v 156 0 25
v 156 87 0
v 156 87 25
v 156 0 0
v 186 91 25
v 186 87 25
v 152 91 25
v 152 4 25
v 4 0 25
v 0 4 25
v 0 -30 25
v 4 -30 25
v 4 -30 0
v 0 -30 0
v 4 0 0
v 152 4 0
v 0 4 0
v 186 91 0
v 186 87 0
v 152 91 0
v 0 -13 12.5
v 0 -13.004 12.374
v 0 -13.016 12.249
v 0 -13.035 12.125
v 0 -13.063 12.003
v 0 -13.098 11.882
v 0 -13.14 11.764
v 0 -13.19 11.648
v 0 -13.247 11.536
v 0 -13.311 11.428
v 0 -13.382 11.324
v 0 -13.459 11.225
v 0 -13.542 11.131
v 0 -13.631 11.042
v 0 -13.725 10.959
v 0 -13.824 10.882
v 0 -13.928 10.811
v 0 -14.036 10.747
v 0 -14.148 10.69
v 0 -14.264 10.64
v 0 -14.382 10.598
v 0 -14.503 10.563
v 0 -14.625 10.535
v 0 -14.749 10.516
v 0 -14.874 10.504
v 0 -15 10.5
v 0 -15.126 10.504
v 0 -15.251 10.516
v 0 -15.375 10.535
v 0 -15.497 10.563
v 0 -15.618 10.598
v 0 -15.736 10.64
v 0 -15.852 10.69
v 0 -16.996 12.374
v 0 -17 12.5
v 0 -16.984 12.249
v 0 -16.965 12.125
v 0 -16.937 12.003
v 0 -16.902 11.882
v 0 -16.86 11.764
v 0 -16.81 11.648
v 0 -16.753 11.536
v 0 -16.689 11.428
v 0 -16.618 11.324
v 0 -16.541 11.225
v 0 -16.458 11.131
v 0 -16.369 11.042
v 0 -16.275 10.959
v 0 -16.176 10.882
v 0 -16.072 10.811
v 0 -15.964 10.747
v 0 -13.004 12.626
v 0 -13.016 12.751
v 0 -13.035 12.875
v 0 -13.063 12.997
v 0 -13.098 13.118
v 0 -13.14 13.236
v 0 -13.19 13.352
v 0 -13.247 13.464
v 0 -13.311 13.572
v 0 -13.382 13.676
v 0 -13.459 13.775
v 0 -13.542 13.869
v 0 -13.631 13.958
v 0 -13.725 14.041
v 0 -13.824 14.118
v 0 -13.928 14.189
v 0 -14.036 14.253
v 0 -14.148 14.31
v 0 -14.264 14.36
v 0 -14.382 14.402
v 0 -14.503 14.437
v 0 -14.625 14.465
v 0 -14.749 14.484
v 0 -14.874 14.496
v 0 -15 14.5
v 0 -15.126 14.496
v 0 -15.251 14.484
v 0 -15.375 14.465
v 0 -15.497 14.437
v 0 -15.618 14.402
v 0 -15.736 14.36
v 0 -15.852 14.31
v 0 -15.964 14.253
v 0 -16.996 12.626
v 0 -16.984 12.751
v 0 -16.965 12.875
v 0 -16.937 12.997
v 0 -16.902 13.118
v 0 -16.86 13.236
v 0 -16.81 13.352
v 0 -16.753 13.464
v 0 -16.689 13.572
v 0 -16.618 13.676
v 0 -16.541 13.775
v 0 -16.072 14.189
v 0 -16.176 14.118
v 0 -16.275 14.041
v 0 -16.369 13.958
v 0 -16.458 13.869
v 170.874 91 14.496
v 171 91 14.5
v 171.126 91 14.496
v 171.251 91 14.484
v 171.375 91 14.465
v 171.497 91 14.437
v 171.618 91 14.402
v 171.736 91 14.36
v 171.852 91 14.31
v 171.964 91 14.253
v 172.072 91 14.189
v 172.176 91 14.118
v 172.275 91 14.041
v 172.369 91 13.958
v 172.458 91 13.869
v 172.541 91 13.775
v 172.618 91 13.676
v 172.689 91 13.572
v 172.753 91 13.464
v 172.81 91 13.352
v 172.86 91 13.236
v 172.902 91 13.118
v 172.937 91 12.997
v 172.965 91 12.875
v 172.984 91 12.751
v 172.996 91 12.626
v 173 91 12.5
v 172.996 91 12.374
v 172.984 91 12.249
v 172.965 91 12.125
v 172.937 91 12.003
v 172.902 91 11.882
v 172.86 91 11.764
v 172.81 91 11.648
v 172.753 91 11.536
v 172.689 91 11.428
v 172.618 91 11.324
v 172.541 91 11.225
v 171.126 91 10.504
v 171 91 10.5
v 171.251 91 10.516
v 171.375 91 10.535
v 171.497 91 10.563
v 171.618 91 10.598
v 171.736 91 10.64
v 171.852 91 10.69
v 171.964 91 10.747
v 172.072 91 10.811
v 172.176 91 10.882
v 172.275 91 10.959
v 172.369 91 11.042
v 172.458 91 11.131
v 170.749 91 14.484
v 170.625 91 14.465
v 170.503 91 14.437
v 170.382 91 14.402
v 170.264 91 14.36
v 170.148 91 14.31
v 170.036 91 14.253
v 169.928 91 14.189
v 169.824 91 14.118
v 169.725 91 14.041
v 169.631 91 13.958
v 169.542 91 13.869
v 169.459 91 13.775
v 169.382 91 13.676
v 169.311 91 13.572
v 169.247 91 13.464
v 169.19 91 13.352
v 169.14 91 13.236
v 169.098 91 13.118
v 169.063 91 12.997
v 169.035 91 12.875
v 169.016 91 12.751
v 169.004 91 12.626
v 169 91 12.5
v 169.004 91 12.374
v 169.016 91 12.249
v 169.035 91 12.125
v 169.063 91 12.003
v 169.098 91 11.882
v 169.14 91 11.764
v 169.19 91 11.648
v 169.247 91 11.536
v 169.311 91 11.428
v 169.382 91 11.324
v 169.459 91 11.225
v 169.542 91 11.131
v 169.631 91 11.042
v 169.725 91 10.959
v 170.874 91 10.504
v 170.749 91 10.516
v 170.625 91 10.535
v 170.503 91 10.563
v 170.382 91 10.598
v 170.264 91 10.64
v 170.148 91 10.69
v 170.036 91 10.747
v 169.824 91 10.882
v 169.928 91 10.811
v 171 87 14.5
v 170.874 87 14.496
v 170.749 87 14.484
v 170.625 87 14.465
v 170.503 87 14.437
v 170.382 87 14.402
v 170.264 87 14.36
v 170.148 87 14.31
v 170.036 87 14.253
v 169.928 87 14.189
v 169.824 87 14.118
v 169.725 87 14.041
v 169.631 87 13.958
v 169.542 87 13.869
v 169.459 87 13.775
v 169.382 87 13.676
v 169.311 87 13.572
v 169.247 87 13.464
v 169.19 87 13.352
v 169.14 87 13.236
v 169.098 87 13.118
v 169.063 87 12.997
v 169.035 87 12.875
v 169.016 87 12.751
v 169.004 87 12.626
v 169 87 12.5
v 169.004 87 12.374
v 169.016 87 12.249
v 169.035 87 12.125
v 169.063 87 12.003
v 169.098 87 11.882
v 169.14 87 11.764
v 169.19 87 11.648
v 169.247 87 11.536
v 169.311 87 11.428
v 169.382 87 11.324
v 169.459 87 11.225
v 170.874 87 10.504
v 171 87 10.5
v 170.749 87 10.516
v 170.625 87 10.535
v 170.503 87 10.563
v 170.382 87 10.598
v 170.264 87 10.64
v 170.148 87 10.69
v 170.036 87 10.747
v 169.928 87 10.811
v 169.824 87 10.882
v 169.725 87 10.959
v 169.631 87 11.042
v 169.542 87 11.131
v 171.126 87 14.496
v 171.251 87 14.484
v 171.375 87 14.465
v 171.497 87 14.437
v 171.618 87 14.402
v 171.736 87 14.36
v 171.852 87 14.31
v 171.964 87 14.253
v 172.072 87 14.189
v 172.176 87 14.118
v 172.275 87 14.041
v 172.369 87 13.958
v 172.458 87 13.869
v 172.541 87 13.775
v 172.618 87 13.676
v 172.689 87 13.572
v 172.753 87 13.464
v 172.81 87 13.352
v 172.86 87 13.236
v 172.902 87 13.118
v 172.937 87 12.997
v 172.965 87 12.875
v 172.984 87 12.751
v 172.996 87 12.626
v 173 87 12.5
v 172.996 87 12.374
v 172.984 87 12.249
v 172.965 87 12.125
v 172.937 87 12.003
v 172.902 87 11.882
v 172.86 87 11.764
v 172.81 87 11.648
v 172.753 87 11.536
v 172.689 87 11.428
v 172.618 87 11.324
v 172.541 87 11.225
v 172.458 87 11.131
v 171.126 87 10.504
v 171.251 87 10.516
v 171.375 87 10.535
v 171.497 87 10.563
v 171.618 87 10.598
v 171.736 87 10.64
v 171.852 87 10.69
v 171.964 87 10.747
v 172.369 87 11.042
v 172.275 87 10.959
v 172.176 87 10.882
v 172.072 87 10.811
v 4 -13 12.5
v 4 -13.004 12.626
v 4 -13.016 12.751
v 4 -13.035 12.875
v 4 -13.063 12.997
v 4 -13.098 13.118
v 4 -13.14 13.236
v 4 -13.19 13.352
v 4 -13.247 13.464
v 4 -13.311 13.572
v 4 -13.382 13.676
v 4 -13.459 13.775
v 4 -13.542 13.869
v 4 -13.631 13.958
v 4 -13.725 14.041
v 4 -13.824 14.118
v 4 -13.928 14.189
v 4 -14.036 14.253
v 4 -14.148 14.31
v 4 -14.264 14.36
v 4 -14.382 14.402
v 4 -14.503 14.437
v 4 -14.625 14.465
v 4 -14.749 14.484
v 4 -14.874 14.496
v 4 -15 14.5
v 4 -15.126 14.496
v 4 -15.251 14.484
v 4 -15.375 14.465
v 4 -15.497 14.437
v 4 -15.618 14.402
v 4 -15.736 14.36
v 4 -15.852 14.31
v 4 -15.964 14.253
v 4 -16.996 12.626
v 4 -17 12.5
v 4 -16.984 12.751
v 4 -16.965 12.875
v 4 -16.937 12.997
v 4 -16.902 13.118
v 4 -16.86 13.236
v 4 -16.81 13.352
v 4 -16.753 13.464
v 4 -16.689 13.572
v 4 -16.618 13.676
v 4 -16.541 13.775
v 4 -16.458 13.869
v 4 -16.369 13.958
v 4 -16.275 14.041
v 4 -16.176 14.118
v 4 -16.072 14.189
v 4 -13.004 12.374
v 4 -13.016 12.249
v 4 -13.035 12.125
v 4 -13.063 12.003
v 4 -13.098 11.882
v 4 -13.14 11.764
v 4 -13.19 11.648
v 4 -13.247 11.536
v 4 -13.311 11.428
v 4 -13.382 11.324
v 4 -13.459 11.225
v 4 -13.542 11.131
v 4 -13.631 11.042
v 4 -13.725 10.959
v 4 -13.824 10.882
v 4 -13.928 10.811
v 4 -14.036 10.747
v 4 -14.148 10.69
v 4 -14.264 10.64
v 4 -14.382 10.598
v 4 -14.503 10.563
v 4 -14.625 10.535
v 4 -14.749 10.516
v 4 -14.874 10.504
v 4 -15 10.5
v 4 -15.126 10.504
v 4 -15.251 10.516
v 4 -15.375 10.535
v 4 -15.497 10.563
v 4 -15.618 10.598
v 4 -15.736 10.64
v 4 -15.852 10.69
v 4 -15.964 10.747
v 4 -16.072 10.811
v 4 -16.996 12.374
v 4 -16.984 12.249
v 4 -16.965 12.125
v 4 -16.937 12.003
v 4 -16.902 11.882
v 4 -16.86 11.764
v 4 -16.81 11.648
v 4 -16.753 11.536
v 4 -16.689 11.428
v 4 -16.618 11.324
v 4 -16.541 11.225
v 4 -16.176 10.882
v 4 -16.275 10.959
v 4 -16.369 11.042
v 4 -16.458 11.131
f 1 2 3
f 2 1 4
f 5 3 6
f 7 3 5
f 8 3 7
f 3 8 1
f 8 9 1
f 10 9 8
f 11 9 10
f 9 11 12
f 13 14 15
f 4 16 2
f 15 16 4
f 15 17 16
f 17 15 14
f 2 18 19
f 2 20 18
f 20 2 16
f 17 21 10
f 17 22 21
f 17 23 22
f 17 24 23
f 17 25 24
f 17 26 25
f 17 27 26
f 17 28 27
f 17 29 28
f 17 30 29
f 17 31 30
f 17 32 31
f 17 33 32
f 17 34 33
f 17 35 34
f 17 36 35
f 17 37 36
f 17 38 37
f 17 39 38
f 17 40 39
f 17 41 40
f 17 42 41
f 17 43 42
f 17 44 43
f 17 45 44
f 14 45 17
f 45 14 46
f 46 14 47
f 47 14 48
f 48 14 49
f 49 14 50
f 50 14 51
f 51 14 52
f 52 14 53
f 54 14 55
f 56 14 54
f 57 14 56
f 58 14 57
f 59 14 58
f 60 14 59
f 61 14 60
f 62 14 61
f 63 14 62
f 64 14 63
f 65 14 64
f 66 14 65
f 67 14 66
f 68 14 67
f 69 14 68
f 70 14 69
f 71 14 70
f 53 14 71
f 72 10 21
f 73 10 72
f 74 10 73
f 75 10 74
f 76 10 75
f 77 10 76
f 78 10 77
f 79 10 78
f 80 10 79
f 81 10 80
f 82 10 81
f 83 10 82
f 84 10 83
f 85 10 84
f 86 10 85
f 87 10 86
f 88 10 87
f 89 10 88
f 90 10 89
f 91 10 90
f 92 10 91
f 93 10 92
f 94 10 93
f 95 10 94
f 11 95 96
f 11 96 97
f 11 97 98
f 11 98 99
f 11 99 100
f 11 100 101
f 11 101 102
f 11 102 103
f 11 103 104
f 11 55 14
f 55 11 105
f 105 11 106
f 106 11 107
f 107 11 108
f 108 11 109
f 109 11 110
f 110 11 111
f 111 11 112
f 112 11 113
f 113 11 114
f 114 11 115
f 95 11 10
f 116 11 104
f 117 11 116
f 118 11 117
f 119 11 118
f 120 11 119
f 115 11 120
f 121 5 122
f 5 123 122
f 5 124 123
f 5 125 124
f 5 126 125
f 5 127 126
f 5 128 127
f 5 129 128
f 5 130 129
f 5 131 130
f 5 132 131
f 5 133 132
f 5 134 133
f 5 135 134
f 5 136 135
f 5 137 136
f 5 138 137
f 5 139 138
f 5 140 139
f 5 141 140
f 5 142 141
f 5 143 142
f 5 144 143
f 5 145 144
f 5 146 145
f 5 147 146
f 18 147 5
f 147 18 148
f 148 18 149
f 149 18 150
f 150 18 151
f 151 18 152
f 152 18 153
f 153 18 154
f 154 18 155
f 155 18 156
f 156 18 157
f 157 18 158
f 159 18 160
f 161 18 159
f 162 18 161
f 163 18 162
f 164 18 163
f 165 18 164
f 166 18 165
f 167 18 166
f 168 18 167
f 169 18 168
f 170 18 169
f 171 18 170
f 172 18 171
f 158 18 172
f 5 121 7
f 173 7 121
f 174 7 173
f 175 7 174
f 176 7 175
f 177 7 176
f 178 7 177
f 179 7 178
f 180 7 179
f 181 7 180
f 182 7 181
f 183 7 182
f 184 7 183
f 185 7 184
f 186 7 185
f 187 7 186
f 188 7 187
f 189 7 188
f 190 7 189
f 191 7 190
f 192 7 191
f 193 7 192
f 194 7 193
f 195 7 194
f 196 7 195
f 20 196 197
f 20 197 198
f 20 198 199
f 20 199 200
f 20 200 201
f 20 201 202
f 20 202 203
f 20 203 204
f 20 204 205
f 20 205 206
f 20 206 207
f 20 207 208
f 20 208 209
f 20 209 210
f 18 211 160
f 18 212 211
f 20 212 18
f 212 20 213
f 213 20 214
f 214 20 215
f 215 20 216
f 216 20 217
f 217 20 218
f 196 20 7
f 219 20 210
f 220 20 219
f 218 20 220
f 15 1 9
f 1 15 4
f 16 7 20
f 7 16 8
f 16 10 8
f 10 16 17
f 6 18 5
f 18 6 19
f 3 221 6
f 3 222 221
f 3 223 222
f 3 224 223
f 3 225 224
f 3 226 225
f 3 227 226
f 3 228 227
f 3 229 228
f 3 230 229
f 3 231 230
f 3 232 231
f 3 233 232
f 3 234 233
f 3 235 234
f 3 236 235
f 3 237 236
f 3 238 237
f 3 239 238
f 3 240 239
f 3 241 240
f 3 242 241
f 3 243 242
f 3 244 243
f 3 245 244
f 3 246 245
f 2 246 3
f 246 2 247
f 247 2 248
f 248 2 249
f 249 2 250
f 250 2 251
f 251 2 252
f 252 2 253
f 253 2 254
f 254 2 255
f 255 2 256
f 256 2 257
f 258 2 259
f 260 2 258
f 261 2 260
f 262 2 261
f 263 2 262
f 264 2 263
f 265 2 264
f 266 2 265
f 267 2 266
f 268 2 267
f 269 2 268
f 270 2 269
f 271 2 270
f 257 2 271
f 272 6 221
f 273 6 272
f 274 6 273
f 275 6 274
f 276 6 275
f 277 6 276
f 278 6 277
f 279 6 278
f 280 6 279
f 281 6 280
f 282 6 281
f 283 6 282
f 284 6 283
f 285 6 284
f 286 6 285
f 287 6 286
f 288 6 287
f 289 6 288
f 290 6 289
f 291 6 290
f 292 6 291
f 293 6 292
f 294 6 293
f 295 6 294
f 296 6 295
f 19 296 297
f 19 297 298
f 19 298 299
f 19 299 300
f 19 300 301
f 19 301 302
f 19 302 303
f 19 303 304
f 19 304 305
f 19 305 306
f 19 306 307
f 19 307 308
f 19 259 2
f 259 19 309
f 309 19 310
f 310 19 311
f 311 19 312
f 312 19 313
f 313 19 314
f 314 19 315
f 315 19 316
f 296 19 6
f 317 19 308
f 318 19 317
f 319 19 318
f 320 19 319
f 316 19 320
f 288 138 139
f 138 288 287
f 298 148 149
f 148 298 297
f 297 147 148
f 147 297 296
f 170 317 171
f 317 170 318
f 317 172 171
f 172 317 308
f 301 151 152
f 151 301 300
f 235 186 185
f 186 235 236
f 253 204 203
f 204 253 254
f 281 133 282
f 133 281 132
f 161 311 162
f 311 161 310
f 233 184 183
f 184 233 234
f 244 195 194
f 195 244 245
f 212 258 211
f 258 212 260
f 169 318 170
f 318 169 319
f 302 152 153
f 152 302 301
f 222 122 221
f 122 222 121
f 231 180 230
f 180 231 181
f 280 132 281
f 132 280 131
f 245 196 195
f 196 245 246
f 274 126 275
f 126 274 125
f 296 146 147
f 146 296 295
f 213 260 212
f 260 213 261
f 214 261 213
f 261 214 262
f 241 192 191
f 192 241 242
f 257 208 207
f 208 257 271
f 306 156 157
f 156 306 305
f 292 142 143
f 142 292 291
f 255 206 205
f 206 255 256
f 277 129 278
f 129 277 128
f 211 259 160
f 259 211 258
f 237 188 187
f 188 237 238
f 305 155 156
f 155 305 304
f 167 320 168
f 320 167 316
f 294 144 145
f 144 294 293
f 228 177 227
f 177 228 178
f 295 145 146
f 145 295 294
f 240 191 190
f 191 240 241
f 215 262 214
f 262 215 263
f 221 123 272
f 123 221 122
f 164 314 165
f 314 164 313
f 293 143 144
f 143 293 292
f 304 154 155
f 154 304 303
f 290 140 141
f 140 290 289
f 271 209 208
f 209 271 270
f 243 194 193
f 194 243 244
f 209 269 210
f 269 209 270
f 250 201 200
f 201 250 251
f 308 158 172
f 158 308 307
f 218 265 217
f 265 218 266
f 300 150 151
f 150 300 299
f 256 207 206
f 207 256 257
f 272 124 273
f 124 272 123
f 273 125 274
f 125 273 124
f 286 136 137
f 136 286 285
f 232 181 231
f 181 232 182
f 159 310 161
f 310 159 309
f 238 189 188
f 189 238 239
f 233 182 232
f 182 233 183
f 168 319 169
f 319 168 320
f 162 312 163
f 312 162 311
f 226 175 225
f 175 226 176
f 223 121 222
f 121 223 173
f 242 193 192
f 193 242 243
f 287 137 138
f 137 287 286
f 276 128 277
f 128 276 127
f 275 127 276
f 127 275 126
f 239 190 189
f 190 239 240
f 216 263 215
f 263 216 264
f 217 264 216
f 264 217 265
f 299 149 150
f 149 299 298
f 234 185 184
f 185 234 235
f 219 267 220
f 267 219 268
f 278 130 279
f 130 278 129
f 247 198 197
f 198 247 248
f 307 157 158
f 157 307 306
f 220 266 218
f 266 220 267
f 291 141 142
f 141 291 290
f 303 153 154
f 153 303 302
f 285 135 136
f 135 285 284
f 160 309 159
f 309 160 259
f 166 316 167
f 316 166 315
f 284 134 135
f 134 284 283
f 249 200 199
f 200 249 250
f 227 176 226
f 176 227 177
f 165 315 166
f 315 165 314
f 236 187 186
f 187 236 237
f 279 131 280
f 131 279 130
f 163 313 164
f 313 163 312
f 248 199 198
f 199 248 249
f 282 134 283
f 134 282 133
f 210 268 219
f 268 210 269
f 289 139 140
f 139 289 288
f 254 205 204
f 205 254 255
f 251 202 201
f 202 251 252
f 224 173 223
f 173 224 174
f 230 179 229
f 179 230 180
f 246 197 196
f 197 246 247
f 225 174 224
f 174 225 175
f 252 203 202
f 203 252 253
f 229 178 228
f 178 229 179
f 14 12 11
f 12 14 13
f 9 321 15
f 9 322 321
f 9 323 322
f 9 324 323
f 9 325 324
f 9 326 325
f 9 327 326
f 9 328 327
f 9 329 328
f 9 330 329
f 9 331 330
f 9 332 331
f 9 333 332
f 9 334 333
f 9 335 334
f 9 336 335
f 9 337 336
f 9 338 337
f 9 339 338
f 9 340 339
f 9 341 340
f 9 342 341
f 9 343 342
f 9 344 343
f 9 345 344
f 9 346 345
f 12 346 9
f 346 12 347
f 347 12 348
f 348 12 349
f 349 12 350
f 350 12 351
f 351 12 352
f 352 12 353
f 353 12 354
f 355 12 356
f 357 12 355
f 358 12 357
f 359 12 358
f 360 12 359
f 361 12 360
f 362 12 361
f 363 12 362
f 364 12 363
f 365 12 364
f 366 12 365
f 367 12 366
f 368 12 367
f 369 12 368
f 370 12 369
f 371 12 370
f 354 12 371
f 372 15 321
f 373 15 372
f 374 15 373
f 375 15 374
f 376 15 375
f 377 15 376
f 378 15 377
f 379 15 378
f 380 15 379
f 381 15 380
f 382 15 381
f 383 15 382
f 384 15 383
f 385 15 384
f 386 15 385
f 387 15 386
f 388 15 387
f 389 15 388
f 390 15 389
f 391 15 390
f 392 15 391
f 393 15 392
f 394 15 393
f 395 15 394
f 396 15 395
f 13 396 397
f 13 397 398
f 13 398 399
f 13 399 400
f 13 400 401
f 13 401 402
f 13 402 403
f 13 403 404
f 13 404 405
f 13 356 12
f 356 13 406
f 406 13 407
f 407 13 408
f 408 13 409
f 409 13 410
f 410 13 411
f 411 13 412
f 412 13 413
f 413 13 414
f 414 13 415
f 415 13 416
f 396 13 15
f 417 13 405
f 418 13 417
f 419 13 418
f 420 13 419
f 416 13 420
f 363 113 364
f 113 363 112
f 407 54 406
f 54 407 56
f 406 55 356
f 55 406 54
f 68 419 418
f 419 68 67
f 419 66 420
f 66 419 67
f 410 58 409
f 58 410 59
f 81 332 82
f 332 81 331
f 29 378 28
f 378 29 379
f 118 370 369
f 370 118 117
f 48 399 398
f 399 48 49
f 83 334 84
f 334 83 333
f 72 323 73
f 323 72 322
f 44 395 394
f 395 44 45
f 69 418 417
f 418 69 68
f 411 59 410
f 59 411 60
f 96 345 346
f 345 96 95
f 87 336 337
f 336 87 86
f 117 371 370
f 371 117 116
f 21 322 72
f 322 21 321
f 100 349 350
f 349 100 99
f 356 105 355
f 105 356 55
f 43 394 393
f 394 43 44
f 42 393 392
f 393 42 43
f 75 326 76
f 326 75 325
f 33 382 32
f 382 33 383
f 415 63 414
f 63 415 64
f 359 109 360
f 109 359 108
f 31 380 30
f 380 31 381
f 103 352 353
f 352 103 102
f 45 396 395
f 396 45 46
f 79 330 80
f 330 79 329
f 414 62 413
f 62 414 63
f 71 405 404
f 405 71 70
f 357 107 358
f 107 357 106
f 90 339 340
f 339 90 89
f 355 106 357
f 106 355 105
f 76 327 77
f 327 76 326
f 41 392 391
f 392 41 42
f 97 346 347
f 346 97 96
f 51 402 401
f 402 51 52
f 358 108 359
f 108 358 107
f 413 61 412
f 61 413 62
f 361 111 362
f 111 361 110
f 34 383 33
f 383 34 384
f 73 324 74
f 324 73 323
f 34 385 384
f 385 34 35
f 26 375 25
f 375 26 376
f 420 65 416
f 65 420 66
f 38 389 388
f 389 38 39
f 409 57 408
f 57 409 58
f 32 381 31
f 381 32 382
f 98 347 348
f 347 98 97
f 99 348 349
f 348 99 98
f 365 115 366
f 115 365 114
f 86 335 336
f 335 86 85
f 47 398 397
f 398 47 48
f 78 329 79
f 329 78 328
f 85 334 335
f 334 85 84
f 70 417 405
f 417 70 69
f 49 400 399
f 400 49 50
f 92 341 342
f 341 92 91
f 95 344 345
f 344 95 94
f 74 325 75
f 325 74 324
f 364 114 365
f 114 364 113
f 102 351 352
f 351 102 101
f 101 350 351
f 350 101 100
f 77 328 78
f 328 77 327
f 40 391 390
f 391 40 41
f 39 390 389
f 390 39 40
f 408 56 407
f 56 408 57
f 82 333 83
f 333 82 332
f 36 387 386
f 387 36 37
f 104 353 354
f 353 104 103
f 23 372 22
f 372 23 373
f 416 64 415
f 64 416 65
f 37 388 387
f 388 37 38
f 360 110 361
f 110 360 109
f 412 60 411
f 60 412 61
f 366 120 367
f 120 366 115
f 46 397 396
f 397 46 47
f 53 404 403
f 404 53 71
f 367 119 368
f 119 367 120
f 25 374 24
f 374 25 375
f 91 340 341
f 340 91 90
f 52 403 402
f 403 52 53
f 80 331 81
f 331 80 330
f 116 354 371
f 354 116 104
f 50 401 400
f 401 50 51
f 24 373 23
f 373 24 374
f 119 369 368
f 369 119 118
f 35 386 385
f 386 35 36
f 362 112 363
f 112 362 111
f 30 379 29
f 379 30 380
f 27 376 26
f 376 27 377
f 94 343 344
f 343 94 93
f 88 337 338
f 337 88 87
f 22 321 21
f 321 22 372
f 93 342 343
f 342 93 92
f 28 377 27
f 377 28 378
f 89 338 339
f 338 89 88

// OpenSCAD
$fn = 100;
b = 152;
h = 87;
w = 25;
t = 4;
l = 30;
r = 2;


module screw_attachment(){
difference(){
	cube([l,t,w]);
	translate([l/2,-0.1,w/2])
	rotate(a=[-90,0,0])
	cylinder(h=t+0.2,r=r);
}
}

difference(){
cube([b+t,h+t,w]);
translate([0,t,0])
cube([b,h,w]);
}

translate([b+t,h,0])
screw_attachment();
rotate(a=[0,0,-90])
screw_attachment();
